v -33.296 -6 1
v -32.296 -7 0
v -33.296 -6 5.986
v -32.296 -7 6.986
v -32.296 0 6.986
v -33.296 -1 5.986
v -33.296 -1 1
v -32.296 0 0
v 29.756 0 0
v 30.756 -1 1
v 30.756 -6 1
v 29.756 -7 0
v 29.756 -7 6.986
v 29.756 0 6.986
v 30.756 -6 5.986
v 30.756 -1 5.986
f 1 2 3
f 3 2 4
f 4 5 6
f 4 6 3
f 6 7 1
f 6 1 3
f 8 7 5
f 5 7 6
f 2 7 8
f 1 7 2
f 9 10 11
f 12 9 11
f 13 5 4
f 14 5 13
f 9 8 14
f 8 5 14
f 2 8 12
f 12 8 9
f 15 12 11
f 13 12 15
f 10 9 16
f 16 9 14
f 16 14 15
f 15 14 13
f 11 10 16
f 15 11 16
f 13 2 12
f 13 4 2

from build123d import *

# Parameters (mm, degrees)
F0_W     = 64.052424
F0_H     = 6.985887
F1_DEPTH = 7
F2_SIZE  = 1
F3_SIZE  = 1


with BuildPart() as f1:
    # F0 (on Front) → F1 (new body)
    with BuildSketch(Plane.XZ):
        with Locations((-1.270161, 3.492943)):
            Rectangle(F0_W, F0_H)
    extrude(amount=F1_DEPTH)

    # F2
    f2_edges = [f1.edges().sort_by_distance(p)[0] for p in [
        (30.756051, -3.5, 6.985887),
        (30.756051, -7, 3.492943),
        (30.756051, -3.5, 0),
        (30.756051, 0, 3.492943),
    ]]
    chamfer(f2_edges, length=F2_SIZE)

    # F3
    f3_edges = [f1.edges().sort_by_distance(p)[0] for p in [
        (-33.296373, -3.5, 6.985887),
        (-33.296373, 0, 3.492943),
        (-33.296373, -3.5, 0),
        (-33.296373, -7, 3.492943),
    ]]
    chamfer(f3_edges, length=F3_SIZE)


solid = f1.part
